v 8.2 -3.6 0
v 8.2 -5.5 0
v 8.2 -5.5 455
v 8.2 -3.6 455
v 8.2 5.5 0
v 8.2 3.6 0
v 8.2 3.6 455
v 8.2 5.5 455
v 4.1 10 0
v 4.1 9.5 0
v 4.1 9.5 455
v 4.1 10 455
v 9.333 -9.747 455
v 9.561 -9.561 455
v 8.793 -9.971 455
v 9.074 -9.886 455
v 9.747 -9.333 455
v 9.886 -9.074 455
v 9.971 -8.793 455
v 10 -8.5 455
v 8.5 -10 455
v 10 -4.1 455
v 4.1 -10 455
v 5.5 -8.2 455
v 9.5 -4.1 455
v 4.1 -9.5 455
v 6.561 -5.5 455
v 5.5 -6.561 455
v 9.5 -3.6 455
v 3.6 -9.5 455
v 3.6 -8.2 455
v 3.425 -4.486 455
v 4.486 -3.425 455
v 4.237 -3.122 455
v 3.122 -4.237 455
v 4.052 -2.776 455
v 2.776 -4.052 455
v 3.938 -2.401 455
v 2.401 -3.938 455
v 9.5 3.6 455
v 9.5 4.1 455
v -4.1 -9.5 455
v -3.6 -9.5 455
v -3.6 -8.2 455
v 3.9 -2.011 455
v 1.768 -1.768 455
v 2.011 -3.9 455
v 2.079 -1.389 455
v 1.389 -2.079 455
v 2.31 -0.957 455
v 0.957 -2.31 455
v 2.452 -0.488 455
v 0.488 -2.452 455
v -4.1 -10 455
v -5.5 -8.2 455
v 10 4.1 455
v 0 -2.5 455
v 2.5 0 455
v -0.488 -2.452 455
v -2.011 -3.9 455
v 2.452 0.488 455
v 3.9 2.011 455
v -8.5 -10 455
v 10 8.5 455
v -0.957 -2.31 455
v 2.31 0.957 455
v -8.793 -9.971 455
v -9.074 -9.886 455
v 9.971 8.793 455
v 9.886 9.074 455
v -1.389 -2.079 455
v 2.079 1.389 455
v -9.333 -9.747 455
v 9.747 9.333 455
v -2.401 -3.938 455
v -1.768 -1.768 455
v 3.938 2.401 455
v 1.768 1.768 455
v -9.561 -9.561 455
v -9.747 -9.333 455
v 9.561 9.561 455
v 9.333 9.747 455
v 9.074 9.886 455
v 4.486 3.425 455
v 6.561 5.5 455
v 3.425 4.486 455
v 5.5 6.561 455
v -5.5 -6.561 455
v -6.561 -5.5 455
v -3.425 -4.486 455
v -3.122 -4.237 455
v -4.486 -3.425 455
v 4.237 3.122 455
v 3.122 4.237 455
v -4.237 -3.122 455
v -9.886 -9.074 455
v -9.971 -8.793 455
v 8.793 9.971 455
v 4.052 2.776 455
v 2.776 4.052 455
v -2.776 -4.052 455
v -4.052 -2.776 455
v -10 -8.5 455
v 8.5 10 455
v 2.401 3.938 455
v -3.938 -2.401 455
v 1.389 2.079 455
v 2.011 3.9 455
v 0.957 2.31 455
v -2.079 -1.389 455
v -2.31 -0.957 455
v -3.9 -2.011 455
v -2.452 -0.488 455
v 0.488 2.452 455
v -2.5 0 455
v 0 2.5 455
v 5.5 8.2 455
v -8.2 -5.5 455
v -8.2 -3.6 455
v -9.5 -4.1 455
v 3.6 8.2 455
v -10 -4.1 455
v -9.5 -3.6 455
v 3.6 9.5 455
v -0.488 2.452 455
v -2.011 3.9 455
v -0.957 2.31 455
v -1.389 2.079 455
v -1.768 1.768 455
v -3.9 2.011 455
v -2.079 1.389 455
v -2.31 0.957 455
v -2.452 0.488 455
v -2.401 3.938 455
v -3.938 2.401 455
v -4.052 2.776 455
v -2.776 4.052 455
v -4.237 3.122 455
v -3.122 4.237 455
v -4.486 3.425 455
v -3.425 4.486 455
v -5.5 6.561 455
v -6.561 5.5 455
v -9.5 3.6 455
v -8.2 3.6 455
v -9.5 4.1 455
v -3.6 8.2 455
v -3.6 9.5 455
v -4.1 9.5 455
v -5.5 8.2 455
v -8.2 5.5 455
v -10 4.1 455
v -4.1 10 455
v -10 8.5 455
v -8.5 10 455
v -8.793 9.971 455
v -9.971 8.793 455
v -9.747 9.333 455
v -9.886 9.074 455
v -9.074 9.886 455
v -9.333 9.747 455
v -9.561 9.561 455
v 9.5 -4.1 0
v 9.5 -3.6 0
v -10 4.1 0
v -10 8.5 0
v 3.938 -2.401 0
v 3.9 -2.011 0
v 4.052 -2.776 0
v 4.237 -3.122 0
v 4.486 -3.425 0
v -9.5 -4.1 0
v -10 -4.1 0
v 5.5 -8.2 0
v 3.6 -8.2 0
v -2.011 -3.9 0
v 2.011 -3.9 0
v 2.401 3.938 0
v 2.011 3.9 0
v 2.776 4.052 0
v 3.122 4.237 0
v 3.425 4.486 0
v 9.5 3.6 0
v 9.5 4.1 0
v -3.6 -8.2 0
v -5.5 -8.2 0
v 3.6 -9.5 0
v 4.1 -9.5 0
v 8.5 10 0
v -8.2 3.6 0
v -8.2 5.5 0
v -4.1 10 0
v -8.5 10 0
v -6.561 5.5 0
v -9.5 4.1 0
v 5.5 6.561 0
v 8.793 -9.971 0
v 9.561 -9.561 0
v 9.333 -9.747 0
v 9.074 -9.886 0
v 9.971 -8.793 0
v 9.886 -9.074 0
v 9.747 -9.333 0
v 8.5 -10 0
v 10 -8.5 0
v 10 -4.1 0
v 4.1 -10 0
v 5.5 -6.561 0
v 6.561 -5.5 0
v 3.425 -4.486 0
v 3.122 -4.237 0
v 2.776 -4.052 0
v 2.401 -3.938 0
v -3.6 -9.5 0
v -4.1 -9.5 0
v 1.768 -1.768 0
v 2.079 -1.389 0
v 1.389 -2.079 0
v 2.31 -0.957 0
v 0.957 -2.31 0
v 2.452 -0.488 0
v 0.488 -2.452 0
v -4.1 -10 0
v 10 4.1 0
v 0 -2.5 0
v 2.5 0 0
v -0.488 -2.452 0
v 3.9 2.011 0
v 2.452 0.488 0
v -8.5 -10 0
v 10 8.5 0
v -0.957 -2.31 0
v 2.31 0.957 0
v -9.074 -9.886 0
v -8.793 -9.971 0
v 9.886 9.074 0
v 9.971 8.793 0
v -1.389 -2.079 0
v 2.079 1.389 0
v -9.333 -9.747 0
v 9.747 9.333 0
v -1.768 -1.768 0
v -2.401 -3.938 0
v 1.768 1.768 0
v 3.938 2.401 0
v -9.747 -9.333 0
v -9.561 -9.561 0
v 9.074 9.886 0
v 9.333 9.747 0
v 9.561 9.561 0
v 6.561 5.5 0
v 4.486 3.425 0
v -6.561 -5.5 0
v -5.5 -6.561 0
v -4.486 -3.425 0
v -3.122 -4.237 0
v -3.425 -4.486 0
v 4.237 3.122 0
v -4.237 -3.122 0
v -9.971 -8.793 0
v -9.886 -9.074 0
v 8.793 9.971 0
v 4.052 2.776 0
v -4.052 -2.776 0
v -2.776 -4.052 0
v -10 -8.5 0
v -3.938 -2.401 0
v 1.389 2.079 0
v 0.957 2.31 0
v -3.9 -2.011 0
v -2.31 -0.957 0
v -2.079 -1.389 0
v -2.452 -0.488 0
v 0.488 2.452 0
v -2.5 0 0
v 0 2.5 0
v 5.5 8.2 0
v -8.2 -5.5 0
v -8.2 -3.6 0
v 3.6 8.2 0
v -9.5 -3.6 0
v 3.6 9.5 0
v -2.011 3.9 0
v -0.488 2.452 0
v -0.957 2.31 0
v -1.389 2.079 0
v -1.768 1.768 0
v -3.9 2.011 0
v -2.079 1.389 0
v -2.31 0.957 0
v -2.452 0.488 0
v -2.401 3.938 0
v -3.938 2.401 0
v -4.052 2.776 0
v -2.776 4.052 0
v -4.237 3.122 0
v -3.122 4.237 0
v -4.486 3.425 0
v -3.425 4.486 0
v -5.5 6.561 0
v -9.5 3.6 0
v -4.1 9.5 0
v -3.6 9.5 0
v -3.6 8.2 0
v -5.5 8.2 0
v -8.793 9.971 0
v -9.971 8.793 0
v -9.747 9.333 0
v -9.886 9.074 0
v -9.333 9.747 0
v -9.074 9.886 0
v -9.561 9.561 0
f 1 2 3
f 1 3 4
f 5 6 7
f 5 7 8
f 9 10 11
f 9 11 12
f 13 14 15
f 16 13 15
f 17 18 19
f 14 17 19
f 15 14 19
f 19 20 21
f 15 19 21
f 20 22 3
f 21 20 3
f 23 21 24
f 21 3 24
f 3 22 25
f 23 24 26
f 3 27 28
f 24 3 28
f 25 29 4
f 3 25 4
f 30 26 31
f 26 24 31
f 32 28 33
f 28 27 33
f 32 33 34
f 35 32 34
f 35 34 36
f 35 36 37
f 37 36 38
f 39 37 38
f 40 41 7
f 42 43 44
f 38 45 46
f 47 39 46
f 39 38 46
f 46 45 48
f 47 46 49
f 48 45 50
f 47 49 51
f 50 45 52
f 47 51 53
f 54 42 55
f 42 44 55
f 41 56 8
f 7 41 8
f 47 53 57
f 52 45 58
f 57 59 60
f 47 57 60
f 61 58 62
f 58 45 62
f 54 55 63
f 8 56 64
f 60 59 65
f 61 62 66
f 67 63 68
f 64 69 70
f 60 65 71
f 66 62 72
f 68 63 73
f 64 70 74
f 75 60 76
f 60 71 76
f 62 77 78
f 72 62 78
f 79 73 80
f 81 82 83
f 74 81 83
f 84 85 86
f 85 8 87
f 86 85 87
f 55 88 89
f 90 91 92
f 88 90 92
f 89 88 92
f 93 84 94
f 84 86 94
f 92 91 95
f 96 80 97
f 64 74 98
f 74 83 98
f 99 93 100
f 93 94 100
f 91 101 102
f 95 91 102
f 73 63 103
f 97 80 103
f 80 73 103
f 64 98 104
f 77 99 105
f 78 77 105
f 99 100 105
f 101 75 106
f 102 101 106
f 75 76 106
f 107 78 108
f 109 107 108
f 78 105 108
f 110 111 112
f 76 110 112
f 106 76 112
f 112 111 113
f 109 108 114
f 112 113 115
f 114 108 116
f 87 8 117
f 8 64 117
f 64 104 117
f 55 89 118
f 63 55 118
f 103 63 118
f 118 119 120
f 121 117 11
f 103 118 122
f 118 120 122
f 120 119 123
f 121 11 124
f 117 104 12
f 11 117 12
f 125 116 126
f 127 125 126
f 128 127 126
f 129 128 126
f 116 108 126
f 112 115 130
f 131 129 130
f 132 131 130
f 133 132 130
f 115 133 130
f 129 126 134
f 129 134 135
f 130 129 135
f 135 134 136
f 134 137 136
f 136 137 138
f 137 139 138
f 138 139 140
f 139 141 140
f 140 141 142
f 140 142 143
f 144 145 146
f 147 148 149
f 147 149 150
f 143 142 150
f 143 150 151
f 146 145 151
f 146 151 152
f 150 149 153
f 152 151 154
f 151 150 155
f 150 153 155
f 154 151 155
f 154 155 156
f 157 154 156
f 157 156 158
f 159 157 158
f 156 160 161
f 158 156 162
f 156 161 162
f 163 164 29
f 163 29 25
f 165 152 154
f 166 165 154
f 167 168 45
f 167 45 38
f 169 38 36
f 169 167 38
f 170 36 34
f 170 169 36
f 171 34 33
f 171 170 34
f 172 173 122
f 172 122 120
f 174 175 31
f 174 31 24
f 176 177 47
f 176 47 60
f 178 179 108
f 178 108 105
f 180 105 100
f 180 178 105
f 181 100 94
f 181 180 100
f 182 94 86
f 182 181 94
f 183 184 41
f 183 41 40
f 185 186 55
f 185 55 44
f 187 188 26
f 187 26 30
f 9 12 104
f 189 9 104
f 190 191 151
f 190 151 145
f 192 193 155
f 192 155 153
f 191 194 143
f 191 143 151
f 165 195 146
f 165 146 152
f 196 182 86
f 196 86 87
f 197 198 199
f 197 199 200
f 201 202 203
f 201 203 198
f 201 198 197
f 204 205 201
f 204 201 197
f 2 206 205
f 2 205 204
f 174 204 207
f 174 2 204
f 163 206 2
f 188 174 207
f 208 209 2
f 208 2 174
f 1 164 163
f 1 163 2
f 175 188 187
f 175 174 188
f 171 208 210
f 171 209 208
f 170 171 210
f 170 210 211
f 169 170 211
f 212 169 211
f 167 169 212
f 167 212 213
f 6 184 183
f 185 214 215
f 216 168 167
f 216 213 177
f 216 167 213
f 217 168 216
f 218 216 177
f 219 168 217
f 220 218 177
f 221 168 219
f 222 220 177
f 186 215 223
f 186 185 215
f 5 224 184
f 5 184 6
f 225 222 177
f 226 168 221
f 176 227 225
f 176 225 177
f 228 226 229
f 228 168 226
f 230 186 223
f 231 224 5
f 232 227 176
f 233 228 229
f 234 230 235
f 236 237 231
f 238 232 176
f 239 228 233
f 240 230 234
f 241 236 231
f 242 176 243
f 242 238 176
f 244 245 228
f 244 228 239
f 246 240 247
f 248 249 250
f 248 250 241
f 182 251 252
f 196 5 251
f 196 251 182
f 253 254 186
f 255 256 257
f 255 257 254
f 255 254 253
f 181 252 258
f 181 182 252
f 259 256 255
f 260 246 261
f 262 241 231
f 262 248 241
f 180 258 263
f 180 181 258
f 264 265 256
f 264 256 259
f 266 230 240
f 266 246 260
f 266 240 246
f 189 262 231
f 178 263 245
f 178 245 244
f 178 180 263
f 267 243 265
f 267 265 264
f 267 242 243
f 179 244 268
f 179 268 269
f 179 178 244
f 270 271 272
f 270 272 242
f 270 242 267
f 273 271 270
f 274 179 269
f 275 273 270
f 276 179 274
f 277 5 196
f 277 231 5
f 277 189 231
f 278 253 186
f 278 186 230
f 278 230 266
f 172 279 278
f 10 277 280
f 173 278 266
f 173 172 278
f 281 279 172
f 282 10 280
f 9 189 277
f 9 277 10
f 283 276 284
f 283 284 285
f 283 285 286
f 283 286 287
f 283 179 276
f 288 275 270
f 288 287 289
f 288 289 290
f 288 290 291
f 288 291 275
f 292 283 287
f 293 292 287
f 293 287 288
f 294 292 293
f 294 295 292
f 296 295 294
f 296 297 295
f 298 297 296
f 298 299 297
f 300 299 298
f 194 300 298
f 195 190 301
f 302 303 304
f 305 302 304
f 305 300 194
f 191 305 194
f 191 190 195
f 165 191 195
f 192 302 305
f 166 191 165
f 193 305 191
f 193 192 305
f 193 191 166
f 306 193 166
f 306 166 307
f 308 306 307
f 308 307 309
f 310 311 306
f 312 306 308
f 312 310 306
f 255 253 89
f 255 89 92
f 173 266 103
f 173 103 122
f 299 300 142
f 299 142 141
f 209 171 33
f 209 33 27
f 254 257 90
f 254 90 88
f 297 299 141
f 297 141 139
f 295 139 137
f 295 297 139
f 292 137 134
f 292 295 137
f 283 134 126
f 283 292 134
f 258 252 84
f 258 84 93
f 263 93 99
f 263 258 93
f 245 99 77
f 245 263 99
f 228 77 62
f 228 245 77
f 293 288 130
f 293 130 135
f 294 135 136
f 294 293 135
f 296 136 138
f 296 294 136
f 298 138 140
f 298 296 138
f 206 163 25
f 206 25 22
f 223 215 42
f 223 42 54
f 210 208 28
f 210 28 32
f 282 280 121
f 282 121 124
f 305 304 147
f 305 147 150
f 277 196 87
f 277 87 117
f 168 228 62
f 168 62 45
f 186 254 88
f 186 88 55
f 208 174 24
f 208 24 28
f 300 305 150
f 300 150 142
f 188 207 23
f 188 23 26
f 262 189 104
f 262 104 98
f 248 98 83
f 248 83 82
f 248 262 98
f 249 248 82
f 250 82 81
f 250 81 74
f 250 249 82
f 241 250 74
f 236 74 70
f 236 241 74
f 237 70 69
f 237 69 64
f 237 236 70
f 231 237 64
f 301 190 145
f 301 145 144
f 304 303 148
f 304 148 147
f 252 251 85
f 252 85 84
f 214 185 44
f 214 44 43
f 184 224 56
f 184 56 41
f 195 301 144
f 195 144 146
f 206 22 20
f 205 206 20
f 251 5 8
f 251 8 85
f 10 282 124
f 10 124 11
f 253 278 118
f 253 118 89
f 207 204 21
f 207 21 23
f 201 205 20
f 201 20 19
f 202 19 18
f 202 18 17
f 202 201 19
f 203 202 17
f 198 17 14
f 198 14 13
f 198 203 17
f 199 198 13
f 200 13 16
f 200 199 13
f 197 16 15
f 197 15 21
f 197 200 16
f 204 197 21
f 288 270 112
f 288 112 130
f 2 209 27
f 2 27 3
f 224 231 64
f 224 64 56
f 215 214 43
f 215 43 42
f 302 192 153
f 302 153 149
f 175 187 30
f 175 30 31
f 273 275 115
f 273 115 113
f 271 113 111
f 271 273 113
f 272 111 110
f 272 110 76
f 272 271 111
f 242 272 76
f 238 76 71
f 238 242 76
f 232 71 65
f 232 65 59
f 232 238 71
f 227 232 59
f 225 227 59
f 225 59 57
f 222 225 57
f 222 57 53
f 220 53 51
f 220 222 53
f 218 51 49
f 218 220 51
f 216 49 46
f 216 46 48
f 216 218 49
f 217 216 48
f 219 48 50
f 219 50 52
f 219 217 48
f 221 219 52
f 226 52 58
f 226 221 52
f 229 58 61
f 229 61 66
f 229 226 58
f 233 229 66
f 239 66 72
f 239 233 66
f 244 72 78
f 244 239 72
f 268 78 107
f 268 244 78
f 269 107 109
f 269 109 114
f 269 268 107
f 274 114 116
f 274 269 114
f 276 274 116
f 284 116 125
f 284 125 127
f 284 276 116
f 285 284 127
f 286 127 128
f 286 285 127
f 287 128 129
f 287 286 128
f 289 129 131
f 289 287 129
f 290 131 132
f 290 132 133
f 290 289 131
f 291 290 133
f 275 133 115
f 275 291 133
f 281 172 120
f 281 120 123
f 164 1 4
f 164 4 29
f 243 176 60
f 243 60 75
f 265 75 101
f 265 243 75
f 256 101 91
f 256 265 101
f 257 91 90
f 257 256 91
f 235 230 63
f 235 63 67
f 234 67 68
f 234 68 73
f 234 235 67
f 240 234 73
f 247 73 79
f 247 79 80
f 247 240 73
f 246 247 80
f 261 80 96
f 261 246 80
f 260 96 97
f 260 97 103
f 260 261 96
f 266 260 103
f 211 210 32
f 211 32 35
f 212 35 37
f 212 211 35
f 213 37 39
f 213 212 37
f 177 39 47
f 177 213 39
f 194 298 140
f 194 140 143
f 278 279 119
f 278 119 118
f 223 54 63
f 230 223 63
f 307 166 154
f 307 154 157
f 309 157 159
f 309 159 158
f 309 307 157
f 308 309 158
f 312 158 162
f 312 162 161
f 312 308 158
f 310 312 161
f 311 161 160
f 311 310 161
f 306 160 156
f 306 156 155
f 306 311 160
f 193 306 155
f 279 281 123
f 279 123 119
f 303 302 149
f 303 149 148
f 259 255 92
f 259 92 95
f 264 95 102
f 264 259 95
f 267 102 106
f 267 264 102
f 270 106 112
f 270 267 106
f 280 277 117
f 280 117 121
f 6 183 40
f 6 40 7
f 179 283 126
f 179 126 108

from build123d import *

# Parameters (mm, degrees)
SKETCH1_R           = 2.5
BOSS_EXTRUDE2_DEPTH = 455


with BuildPart() as part:
    # Sketch1 → Boss-Extrude2 (new body)
    with BuildSketch(Plane.XY):
        with BuildLine():
            Line((10, -4.1), (10, -8.5))
            ThreePointArc((10, -8.5), (9.560660172, -9.560660172), (8.5, -10))
            Line((8.5, -10), (4.1, -10))
            Line((4.1, -10), (4.1, -9.5))
            Line((4.1, -9.5), (3.6, -9.5))
            Line((3.6, -9.5), (3.6, -8.2))
            Line((3.6, -8.2), (5.5, -8.2))
            Line((5.5, -8.2), (5.5, -6.560660172))
            Line((5.5, -6.560660172), (3.425126266, -4.485786438))
            ThreePointArc((3.425126266, -4.485786438), (2.776279568, -4.052240935), (2.010912703, -3.9))
            Line((2.010912703, -3.9), (-2.010912703, -3.9))
            ThreePointArc((-2.010912703, -3.9), (-2.776279568, -4.052240935), (-3.425126266, -4.485786438))
            Line((-3.425126266, -4.485786438), (-5.5, -6.560660172))
            Line((-5.5, -6.560660172), (-5.5, -8.2))
            Line((-5.5, -8.2), (-3.6, -8.2))
            Line((-3.6, -8.2), (-3.6, -9.5))
            Line((-3.6, -9.5), (-4.1, -9.5))
            Line((-4.1, -9.5), (-4.1, -10))
            Line((-4.1, -10), (-8.5, -10))
            ThreePointArc((-8.5, -10), (-9.560660172, -9.560660172), (-10, -8.5))
            Line((-10, -8.5), (-10, -4.1))
            Line((-10, -4.1), (-9.5, -4.1))
            Line((-9.5, -4.1), (-9.5, -3.6))
            Line((-9.5, -3.6), (-8.2, -3.6))
            Line((-8.2, -3.6), (-8.2, -5.5))
            Line((-8.2, -5.5), (-6.560660172, -5.5))
            Line((-6.560660172, -5.5), (-4.485786438, -3.425126266))
            ThreePointArc((-4.485786438, -3.425126266), (-4.052240935, -2.776279568), (-3.9, -2.010912703))
            Line((-3.9, -2.010912703), (-3.9, 2.010912703))
            ThreePointArc((-3.9, 2.010912703), (-4.052240935, 2.776279568), (-4.485786438, 3.425126266))
            Line((-4.485786438, 3.425126266), (-6.560660172, 5.5))
            Line((-6.560660172, 5.5), (-8.2, 5.5))
            Line((-8.2, 5.5), (-8.2, 3.6))
            Line((-8.2, 3.6), (-9.5, 3.6))
            Line((-9.5, 3.6), (-9.5, 4.1))
            Line((-9.5, 4.1), (-10, 4.1))
            Line((-10, 4.1), (-10, 8.5))
            ThreePointArc((-10, 8.5), (-9.560660172, 9.560660172), (-8.5, 10))
            Line((-8.5, 10), (-4.1, 10))
            Line((-4.1, 10), (-4.1, 9.5))
            Line((-4.1, 9.5), (-3.6, 9.5))
            Line((-3.6, 9.5), (-3.6, 8.2))
            Line((-3.6, 8.2), (-5.5, 8.2))
            Line((-5.5, 8.2), (-5.5, 6.560660172))
            Line((-5.5, 6.560660172), (-3.425126266, 4.485786438))
            ThreePointArc((-3.425126266, 4.485786438), (-2.776279568, 4.052240935), (-2.010912703, 3.9))
            Line((-2.010912703, 3.9), (2.010912703, 3.9))
            ThreePointArc((2.010912703, 3.9), (2.776279568, 4.052240935), (3.425126266, 4.485786438))
            Line((3.425126266, 4.485786438), (5.5, 6.560660172))
            Line((5.5, 6.560660172), (5.5, 8.2))
            Line((5.5, 8.2), (3.6, 8.2))
            Line((3.6, 8.2), (3.6, 9.5))
            Line((3.6, 9.5), (4.1, 9.5))
            Line((4.1, 9.5), (4.1, 10))
            Line((4.1, 10), (8.5, 10))
            ThreePointArc((8.5, 10), (9.560660172, 9.560660172), (10, 8.5))
            Line((10, 8.5), (10, 4.1))
            Line((10, 4.1), (9.5, 4.1))
            Line((9.5, 4.1), (9.5, 3.6))
            Line((9.5, 3.6), (8.2, 3.6))
            Line((8.2, 3.6), (8.2, 5.5))
            Line((8.2, 5.5), (6.560660172, 5.5))
            Line((6.560660172, 5.5), (4.485786438, 3.425126266))
            ThreePointArc((4.485786438, 3.425126266), (4.052240935, 2.776279568), (3.9, 2.010912703))
            Line((3.9, 2.010912703), (3.9, -2.010912703))
            ThreePointArc((3.9, -2.010912703), (4.052240935, -2.776279568), (4.485786438, -3.425126266))
            Line((4.485786438, -3.425126266), (6.560660172, -5.5))
            Line((6.560660172, -5.5), (8.2, -5.5))
            Line((8.2, -5.5), (8.2, -3.6))
            Line((8.2, -3.6), (9.5, -3.6))
            Line((9.5, -3.6), (9.5, -4.1))
            Line((9.5, -4.1), (10, -4.1))
        make_face()
        with Locations(Location((0, 0, 0), (0, 0, 180))):
            Circle(SKETCH1_R, mode=Mode.SUBTRACT)
    extrude(amount=BOSS_EXTRUDE2_DEPTH)


solid = part.part
